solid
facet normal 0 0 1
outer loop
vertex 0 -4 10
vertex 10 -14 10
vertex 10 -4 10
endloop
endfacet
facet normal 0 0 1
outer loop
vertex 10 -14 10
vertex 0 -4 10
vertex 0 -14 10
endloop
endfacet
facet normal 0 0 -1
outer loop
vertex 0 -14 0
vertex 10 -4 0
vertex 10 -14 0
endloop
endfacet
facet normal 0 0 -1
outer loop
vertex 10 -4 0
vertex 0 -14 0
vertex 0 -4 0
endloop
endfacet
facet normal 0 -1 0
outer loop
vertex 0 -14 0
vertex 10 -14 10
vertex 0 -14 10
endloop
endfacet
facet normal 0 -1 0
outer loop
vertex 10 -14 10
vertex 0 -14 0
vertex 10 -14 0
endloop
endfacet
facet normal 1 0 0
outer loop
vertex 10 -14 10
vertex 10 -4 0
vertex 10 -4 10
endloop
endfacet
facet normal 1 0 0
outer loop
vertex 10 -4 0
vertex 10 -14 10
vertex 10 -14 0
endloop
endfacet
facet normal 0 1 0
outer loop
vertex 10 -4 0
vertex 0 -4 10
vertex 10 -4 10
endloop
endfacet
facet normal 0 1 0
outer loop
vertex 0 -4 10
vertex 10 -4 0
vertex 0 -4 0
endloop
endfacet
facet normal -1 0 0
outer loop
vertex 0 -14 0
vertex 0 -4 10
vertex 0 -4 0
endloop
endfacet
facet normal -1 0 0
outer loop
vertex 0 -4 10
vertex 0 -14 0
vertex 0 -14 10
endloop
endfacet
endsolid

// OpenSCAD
//$vpt = [4, 3, 15];

//$vpr = [60, 0, 360];

//$vpd = 180;

 

offset = [$t, -8 / 2 - 10];

translate(offset) cube(10);
